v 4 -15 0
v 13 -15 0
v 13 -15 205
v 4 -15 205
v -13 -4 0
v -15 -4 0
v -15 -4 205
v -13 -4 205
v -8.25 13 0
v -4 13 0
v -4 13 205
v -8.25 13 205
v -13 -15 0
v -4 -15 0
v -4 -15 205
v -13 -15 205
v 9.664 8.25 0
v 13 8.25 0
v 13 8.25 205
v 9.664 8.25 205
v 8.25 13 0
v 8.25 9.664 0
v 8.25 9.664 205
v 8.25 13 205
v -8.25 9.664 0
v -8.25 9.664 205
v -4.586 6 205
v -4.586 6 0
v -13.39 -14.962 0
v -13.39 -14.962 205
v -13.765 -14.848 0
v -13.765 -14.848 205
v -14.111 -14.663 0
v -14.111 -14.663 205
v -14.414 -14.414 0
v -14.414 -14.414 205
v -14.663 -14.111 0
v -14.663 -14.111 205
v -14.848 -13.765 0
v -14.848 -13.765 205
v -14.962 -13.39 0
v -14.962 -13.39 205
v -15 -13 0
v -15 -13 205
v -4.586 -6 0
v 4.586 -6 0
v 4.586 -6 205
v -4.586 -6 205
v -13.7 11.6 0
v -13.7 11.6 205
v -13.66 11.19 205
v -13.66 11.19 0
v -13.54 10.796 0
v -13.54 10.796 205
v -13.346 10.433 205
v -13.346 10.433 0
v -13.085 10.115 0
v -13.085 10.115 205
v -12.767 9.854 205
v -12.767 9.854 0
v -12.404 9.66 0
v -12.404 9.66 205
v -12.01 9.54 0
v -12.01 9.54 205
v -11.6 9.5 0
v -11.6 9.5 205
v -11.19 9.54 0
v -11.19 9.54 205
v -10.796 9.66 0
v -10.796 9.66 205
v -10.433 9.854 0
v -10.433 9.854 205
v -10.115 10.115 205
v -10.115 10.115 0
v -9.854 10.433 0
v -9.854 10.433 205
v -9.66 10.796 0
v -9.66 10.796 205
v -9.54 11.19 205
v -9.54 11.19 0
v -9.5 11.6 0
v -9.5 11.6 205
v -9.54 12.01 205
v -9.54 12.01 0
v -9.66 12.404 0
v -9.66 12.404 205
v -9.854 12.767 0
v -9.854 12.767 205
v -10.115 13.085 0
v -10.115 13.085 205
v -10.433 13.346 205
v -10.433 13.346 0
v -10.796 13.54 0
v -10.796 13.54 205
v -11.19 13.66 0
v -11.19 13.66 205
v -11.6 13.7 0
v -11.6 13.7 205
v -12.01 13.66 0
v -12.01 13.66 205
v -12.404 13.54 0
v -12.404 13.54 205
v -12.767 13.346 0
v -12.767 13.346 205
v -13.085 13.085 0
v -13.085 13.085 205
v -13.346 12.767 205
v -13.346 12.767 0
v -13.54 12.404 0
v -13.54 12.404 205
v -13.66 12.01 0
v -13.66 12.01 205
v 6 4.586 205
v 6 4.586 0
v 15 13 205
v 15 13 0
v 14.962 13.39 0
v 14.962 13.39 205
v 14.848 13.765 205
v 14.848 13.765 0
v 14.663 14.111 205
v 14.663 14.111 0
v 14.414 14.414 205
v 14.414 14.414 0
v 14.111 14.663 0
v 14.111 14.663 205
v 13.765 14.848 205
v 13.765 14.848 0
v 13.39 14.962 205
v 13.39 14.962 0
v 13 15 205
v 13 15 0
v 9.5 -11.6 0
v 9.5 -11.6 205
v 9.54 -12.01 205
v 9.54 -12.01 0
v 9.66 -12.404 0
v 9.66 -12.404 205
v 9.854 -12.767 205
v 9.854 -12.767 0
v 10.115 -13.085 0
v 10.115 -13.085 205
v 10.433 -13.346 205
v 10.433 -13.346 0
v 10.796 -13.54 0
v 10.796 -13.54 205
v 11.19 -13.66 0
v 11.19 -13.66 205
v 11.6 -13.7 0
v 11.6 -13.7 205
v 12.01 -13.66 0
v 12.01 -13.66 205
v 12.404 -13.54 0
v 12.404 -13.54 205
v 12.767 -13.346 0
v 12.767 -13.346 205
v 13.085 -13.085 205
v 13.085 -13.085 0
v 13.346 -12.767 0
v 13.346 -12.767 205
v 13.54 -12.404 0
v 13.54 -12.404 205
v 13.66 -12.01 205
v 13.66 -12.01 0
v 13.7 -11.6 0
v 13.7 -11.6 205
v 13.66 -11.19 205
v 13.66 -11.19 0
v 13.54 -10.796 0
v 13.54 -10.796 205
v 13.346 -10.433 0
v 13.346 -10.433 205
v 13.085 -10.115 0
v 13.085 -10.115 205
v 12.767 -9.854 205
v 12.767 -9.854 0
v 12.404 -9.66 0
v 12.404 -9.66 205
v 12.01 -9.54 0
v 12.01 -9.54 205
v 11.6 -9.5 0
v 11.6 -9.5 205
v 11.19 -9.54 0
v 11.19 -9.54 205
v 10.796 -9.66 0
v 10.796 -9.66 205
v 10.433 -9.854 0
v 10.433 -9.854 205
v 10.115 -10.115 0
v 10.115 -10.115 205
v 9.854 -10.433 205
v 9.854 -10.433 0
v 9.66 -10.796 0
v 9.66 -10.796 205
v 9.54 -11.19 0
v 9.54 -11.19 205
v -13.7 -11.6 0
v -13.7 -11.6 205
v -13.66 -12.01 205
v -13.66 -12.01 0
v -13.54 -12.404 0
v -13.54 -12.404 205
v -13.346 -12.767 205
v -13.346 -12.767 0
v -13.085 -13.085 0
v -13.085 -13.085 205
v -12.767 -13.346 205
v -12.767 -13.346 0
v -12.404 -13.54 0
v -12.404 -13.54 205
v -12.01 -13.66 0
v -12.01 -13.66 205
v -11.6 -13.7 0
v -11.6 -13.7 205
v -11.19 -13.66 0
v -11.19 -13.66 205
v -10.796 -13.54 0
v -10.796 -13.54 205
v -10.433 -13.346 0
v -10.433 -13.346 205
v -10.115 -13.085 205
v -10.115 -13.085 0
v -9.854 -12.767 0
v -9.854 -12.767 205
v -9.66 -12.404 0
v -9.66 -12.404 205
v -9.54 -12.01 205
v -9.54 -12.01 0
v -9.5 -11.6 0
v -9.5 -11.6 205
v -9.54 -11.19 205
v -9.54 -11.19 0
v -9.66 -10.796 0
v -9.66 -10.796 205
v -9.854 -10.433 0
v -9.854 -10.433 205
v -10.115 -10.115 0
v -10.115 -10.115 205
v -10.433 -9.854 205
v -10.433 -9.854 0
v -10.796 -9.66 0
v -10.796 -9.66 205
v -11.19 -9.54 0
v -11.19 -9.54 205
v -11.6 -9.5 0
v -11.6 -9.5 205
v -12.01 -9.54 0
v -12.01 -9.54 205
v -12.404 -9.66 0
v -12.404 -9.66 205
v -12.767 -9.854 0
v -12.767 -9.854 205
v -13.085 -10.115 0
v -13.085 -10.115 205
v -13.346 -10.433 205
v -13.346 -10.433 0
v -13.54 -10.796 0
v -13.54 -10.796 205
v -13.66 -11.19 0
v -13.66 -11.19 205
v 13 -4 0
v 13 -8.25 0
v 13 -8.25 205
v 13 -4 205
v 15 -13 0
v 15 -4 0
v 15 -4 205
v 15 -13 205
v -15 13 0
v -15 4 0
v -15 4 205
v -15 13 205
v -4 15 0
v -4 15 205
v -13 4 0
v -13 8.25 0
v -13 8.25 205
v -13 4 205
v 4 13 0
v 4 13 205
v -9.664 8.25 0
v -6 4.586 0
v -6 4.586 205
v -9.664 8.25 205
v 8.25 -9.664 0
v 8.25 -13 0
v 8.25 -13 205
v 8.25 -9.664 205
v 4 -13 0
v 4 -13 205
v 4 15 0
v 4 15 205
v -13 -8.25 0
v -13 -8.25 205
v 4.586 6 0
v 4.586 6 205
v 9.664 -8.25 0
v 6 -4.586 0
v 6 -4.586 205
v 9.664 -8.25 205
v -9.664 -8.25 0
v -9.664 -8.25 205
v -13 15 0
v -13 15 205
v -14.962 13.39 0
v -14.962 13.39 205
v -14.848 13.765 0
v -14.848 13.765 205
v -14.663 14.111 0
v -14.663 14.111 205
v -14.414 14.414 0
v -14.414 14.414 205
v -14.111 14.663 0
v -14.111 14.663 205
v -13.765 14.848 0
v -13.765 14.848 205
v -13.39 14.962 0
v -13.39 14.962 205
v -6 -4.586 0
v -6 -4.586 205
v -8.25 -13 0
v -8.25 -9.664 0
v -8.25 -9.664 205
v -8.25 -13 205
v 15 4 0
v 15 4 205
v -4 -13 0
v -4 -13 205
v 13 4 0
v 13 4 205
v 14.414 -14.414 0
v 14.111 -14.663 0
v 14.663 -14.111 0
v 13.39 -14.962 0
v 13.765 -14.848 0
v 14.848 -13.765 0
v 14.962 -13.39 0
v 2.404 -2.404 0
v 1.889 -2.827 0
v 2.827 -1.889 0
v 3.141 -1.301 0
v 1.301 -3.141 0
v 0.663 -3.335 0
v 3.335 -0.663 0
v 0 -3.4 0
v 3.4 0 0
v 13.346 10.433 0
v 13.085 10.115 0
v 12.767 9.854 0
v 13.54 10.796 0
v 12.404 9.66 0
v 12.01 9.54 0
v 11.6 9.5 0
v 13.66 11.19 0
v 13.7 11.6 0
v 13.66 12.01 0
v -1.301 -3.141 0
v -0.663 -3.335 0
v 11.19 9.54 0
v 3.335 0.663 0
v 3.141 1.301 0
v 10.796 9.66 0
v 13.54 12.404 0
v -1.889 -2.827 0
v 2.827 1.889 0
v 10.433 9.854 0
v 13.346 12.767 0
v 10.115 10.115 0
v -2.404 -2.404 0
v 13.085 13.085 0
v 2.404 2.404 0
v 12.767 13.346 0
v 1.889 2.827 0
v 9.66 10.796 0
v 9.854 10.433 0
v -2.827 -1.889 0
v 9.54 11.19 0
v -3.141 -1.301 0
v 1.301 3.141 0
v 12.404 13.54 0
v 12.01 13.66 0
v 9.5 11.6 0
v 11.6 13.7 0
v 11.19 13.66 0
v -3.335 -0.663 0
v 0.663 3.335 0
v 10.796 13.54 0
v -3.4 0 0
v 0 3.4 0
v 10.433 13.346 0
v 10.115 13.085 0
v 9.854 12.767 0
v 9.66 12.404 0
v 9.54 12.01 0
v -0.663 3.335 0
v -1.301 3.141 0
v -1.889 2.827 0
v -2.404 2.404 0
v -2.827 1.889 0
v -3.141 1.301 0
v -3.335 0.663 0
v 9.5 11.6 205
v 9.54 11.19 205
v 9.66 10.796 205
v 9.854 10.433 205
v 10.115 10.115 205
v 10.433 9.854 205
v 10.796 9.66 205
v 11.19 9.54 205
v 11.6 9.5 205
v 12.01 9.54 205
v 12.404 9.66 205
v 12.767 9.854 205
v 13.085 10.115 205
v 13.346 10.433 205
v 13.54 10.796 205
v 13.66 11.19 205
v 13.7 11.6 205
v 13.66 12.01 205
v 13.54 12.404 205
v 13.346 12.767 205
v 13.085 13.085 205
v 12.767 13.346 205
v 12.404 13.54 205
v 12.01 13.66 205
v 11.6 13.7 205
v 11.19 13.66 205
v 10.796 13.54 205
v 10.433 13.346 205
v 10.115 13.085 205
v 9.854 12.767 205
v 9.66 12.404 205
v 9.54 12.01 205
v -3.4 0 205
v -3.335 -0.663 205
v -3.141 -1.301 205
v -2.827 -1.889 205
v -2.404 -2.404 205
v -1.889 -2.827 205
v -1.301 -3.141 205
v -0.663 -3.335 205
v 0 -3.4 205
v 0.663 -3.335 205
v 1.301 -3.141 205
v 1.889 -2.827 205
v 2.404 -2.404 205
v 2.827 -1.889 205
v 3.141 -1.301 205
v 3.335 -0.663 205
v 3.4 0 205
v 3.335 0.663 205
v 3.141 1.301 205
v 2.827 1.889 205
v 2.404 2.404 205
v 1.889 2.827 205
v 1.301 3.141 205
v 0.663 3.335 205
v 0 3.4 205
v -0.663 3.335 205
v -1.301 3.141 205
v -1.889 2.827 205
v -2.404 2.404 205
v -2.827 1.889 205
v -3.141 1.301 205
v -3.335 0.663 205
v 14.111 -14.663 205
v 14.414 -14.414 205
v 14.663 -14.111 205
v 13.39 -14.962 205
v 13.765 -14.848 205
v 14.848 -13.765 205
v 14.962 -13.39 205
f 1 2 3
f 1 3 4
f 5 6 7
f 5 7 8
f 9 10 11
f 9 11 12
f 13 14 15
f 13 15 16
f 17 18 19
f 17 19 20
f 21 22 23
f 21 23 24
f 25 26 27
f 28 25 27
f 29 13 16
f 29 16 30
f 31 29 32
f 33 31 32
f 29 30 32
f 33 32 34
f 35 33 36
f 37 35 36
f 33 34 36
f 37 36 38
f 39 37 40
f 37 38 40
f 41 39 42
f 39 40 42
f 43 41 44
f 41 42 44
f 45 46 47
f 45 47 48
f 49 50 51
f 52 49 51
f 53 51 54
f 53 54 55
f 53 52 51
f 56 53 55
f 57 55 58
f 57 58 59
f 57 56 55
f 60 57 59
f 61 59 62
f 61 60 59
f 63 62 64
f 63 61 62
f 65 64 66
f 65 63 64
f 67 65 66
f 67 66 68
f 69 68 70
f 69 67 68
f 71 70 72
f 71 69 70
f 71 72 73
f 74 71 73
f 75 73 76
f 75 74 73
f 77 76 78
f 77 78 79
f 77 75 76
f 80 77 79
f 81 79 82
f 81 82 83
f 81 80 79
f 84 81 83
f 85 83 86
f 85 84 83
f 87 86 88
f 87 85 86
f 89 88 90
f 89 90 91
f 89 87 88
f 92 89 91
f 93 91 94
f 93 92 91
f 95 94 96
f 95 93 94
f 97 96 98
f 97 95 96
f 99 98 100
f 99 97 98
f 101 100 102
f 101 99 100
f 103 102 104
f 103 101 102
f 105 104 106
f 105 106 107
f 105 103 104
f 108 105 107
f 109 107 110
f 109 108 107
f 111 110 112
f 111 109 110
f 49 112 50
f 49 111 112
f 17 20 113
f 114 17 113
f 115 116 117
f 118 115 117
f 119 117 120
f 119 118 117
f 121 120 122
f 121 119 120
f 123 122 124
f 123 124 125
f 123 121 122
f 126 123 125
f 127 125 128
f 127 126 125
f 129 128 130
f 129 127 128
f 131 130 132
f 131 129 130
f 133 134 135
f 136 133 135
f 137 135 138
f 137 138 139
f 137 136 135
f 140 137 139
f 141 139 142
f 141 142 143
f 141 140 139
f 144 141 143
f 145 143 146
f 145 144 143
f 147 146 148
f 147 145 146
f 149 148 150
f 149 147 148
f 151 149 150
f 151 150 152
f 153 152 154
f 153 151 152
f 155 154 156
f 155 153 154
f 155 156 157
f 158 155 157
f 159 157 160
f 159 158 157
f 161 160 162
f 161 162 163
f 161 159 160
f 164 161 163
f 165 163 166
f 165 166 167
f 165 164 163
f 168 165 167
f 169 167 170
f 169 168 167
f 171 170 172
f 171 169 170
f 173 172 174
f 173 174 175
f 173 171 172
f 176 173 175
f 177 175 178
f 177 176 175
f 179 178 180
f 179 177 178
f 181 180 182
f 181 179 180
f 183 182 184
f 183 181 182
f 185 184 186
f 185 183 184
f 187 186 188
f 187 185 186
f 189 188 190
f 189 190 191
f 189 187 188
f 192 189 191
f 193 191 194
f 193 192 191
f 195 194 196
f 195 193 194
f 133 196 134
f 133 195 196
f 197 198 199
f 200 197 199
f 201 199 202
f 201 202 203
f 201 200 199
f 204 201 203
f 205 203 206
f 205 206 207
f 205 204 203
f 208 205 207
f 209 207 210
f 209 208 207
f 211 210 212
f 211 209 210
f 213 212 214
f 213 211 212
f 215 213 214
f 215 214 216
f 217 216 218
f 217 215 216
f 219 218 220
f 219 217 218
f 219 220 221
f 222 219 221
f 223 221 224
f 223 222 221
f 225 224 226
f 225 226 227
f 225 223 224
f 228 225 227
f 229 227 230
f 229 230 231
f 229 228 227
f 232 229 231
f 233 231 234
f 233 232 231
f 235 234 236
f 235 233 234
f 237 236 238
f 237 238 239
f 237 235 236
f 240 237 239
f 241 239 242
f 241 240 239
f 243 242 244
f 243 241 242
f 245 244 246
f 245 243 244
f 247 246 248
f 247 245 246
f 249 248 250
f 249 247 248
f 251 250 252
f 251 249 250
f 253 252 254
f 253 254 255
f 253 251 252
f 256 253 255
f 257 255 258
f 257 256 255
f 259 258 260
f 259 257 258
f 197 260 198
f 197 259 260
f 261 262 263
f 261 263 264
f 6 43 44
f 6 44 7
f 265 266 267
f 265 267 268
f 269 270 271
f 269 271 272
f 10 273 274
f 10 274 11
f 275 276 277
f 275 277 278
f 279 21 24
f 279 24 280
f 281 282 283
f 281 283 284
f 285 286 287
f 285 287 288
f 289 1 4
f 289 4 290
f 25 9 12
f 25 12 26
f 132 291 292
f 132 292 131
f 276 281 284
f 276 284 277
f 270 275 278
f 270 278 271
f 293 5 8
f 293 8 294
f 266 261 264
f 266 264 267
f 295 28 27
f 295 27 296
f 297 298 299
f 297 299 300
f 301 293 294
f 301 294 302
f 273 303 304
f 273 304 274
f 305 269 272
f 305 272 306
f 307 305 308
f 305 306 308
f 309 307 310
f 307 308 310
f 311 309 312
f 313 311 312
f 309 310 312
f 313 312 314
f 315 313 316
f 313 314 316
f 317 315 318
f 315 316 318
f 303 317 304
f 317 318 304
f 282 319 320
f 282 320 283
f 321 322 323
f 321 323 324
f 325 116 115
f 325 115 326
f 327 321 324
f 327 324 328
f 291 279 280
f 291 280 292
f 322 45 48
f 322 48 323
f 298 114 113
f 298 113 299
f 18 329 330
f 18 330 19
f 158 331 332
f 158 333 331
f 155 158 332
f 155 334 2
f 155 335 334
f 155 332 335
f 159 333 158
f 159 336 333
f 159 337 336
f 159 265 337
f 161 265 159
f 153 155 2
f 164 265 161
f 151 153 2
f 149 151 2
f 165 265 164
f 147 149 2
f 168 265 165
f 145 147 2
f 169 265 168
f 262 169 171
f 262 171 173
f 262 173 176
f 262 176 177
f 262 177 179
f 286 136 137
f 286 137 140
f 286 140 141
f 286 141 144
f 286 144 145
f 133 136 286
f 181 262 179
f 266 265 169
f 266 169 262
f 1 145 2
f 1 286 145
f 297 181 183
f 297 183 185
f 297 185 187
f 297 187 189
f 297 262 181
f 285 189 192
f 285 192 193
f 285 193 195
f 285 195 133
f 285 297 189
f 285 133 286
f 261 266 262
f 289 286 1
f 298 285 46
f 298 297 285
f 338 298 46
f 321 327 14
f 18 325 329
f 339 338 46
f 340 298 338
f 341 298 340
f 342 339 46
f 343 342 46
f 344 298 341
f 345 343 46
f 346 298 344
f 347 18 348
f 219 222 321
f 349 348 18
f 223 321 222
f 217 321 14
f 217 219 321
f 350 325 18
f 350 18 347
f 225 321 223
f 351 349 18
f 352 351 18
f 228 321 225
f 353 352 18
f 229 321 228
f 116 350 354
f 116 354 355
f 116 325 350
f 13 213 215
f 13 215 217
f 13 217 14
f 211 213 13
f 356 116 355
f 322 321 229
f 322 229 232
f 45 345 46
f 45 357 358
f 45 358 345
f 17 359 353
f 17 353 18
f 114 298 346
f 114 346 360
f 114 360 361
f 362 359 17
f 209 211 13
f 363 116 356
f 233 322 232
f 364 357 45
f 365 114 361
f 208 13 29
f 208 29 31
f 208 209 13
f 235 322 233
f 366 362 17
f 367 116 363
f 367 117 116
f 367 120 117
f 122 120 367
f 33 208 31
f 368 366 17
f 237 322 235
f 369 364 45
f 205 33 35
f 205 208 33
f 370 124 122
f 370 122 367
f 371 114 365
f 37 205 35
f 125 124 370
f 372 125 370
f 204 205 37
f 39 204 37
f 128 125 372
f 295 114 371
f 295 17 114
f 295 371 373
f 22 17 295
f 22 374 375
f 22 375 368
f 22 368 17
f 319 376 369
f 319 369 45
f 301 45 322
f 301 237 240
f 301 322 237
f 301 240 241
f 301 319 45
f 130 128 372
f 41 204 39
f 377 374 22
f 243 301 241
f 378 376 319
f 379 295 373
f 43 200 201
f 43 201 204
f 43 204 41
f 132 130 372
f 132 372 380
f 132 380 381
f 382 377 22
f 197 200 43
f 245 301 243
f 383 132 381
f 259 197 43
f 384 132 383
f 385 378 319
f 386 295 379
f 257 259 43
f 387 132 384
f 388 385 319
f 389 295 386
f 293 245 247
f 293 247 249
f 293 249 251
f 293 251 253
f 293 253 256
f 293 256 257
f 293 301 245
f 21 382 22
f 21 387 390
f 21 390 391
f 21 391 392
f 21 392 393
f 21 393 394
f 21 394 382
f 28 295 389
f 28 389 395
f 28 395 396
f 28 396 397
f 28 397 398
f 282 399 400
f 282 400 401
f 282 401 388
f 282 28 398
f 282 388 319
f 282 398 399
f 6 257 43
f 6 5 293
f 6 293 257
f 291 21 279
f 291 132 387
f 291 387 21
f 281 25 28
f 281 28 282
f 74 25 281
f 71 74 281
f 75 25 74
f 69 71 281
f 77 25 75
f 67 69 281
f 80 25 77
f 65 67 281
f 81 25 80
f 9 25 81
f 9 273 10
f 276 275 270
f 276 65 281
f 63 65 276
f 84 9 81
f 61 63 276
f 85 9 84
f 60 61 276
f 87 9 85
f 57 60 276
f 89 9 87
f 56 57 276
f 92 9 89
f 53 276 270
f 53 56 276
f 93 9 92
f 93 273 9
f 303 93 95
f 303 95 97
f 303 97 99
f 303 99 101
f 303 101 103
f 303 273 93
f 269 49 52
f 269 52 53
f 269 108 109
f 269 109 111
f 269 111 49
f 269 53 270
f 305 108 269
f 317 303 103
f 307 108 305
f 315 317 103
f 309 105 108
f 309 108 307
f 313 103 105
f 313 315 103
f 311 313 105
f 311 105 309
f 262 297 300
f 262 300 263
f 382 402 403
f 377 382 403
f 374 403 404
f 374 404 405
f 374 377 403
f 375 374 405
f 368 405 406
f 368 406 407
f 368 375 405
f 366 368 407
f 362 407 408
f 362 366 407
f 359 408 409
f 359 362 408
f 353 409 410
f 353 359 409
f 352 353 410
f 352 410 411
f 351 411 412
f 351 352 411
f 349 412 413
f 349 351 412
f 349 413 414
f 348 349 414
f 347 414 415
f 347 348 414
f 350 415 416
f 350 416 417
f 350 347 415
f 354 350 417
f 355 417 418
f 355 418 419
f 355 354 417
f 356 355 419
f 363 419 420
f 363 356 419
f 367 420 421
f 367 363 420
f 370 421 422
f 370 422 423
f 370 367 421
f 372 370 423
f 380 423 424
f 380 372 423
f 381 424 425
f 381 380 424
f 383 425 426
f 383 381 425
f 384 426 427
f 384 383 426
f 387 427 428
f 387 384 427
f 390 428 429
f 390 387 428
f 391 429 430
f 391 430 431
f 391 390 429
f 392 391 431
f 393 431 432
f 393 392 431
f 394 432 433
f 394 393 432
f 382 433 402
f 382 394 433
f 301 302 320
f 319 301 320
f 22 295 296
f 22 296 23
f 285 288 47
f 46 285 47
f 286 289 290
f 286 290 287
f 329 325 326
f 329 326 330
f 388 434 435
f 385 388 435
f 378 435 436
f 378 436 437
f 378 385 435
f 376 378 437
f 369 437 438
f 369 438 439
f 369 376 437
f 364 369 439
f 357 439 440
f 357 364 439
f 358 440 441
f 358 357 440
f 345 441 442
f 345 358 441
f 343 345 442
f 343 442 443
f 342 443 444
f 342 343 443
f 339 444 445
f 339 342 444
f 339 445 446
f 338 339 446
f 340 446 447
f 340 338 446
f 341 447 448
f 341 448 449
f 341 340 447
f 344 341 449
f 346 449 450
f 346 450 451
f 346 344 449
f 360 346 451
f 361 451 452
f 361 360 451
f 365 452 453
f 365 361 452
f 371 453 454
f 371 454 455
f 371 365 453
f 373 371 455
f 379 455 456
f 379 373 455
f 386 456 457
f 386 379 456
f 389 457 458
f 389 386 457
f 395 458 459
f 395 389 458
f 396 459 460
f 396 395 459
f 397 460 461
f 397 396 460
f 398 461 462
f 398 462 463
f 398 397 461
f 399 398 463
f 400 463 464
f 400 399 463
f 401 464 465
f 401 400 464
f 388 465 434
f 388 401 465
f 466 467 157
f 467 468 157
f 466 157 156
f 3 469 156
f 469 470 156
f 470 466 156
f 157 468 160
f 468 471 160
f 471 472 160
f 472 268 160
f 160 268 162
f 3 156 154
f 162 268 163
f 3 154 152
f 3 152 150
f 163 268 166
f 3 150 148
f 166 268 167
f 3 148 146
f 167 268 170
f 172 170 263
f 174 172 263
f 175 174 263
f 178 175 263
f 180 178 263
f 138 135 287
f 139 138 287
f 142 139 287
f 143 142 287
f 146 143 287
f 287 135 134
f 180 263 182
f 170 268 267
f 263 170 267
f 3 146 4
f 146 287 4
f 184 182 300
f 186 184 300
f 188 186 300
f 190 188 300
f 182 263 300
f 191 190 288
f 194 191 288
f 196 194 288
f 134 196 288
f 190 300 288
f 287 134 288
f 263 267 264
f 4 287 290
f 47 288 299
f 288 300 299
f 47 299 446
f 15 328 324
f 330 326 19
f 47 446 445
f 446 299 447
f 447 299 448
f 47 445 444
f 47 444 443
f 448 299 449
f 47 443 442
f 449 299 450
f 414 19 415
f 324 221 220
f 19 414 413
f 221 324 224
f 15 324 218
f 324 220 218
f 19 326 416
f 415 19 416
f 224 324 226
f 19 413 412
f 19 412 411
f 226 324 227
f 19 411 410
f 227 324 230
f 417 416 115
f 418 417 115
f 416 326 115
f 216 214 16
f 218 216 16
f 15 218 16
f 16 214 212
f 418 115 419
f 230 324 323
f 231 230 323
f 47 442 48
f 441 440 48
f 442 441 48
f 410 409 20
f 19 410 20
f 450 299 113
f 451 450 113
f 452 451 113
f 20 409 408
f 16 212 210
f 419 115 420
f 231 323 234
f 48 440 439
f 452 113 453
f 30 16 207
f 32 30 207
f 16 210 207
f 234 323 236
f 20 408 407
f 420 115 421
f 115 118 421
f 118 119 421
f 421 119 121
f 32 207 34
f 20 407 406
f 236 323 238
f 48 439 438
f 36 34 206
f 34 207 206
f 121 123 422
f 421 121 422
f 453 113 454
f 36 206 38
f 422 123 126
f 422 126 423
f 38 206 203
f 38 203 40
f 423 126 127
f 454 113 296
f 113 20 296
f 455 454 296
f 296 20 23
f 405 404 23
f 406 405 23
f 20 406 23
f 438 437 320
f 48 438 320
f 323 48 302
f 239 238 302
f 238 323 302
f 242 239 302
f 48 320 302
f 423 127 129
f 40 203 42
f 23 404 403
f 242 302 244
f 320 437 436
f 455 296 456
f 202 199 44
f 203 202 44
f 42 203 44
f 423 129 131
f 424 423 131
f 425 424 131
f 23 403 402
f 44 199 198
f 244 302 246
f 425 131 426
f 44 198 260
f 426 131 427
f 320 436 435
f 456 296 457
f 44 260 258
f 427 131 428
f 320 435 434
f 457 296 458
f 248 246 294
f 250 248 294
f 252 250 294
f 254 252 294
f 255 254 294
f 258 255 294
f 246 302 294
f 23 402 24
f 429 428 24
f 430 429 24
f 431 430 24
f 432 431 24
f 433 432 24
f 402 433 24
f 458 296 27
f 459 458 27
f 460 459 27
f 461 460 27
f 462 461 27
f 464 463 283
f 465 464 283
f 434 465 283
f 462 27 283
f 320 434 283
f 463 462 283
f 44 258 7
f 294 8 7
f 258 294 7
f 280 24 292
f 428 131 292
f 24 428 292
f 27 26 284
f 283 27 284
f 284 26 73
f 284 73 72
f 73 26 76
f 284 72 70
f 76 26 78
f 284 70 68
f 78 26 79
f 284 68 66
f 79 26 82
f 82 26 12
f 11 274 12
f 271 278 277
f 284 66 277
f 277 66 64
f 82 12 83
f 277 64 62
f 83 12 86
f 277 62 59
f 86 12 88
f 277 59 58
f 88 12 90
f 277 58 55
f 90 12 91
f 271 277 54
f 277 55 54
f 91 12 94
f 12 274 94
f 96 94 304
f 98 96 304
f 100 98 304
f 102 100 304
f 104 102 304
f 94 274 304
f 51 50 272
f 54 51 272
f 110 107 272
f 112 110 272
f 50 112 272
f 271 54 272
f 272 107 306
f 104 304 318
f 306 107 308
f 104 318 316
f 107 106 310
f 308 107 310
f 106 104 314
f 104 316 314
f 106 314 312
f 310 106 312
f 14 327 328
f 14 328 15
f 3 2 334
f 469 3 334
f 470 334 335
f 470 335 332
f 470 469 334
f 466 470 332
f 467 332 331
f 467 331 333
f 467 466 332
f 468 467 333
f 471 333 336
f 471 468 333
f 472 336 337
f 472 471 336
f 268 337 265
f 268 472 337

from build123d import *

# Parameters (mm, degrees)
SKETCH1_R           = 3.4
SKETCH1_R_2         = 2.1
BOSS_EXTRUDE1_DEPTH = 205
FILLET1_R           = 2


with BuildPart() as part:
    # Sketch1 → Boss-Extrude1 (new body)
    with BuildSketch(Plane.XY):
        Polygon((15, -15), (4, -15), (4, -13), (8.25, -13), (8.25, -9.664213562), (4.585786438, -6), (-4.585786438, -6), (-8.25, -9.664213562), (-8.25, -13), (-4, -13), (-4, -15), (-15, -15), (-15, -4), (-13, -4), (-13, -8.25), (-9.664213562, -8.25), (-6, -4.585786438), (-6, 4.585786438), (-9.664213562, 8.25), (-13, 8.25), (-13, 4), (-15, 4), (-15, 15), (-4, 15), (-4, 13), (-8.25, 13), (-8.25, 9.664213562), (-4.585786438, 6), (4.585786438, 6), (8.25, 9.664213562), (8.25, 13), (4, 13), (4, 15), (15, 15), (15, 4), (13, 4), (13, 8.25), (9.664213562, 8.25), (6, 4.585786438), (6, -4.585786438), (9.664213562, -8.25), (13, -8.25), (13, -4), (15, -4), align=None)
        with Locations(Location((0, 0, 0), (0, 0, 180))):
            Circle(SKETCH1_R, mode=Mode.SUBTRACT)
        with Locations(Location((-11.6, 11.6, 0), (0, 0, 180))):
            Circle(SKETCH1_R_2, mode=Mode.SUBTRACT)
        with Locations(Location((11.6, 11.6, 0), (0, 0, 180))):
            Circle(SKETCH1_R_2, mode=Mode.SUBTRACT)
        with Locations(Location((11.6, -11.6, 0), (0, 0, 180))):
            Circle(SKETCH1_R_2, mode=Mode.SUBTRACT)
        with Locations(Location((-11.6, -11.6, 0), (0, 0, 180))):
            Circle(SKETCH1_R_2, mode=Mode.SUBTRACT)
    extrude(amount=BOSS_EXTRUDE1_DEPTH)

    # Fillet1
    fillet1_edges = [part.edges().sort_by_distance(p)[0] for p in [
        (-15, -15, 102.5),
        (-15, 15, 102.5),
        (15, 15, 102.5),
        (15, -15, 102.5),
    ]]
    fillet(fillet1_edges, radius=FILLET1_R)


solid = part.part
